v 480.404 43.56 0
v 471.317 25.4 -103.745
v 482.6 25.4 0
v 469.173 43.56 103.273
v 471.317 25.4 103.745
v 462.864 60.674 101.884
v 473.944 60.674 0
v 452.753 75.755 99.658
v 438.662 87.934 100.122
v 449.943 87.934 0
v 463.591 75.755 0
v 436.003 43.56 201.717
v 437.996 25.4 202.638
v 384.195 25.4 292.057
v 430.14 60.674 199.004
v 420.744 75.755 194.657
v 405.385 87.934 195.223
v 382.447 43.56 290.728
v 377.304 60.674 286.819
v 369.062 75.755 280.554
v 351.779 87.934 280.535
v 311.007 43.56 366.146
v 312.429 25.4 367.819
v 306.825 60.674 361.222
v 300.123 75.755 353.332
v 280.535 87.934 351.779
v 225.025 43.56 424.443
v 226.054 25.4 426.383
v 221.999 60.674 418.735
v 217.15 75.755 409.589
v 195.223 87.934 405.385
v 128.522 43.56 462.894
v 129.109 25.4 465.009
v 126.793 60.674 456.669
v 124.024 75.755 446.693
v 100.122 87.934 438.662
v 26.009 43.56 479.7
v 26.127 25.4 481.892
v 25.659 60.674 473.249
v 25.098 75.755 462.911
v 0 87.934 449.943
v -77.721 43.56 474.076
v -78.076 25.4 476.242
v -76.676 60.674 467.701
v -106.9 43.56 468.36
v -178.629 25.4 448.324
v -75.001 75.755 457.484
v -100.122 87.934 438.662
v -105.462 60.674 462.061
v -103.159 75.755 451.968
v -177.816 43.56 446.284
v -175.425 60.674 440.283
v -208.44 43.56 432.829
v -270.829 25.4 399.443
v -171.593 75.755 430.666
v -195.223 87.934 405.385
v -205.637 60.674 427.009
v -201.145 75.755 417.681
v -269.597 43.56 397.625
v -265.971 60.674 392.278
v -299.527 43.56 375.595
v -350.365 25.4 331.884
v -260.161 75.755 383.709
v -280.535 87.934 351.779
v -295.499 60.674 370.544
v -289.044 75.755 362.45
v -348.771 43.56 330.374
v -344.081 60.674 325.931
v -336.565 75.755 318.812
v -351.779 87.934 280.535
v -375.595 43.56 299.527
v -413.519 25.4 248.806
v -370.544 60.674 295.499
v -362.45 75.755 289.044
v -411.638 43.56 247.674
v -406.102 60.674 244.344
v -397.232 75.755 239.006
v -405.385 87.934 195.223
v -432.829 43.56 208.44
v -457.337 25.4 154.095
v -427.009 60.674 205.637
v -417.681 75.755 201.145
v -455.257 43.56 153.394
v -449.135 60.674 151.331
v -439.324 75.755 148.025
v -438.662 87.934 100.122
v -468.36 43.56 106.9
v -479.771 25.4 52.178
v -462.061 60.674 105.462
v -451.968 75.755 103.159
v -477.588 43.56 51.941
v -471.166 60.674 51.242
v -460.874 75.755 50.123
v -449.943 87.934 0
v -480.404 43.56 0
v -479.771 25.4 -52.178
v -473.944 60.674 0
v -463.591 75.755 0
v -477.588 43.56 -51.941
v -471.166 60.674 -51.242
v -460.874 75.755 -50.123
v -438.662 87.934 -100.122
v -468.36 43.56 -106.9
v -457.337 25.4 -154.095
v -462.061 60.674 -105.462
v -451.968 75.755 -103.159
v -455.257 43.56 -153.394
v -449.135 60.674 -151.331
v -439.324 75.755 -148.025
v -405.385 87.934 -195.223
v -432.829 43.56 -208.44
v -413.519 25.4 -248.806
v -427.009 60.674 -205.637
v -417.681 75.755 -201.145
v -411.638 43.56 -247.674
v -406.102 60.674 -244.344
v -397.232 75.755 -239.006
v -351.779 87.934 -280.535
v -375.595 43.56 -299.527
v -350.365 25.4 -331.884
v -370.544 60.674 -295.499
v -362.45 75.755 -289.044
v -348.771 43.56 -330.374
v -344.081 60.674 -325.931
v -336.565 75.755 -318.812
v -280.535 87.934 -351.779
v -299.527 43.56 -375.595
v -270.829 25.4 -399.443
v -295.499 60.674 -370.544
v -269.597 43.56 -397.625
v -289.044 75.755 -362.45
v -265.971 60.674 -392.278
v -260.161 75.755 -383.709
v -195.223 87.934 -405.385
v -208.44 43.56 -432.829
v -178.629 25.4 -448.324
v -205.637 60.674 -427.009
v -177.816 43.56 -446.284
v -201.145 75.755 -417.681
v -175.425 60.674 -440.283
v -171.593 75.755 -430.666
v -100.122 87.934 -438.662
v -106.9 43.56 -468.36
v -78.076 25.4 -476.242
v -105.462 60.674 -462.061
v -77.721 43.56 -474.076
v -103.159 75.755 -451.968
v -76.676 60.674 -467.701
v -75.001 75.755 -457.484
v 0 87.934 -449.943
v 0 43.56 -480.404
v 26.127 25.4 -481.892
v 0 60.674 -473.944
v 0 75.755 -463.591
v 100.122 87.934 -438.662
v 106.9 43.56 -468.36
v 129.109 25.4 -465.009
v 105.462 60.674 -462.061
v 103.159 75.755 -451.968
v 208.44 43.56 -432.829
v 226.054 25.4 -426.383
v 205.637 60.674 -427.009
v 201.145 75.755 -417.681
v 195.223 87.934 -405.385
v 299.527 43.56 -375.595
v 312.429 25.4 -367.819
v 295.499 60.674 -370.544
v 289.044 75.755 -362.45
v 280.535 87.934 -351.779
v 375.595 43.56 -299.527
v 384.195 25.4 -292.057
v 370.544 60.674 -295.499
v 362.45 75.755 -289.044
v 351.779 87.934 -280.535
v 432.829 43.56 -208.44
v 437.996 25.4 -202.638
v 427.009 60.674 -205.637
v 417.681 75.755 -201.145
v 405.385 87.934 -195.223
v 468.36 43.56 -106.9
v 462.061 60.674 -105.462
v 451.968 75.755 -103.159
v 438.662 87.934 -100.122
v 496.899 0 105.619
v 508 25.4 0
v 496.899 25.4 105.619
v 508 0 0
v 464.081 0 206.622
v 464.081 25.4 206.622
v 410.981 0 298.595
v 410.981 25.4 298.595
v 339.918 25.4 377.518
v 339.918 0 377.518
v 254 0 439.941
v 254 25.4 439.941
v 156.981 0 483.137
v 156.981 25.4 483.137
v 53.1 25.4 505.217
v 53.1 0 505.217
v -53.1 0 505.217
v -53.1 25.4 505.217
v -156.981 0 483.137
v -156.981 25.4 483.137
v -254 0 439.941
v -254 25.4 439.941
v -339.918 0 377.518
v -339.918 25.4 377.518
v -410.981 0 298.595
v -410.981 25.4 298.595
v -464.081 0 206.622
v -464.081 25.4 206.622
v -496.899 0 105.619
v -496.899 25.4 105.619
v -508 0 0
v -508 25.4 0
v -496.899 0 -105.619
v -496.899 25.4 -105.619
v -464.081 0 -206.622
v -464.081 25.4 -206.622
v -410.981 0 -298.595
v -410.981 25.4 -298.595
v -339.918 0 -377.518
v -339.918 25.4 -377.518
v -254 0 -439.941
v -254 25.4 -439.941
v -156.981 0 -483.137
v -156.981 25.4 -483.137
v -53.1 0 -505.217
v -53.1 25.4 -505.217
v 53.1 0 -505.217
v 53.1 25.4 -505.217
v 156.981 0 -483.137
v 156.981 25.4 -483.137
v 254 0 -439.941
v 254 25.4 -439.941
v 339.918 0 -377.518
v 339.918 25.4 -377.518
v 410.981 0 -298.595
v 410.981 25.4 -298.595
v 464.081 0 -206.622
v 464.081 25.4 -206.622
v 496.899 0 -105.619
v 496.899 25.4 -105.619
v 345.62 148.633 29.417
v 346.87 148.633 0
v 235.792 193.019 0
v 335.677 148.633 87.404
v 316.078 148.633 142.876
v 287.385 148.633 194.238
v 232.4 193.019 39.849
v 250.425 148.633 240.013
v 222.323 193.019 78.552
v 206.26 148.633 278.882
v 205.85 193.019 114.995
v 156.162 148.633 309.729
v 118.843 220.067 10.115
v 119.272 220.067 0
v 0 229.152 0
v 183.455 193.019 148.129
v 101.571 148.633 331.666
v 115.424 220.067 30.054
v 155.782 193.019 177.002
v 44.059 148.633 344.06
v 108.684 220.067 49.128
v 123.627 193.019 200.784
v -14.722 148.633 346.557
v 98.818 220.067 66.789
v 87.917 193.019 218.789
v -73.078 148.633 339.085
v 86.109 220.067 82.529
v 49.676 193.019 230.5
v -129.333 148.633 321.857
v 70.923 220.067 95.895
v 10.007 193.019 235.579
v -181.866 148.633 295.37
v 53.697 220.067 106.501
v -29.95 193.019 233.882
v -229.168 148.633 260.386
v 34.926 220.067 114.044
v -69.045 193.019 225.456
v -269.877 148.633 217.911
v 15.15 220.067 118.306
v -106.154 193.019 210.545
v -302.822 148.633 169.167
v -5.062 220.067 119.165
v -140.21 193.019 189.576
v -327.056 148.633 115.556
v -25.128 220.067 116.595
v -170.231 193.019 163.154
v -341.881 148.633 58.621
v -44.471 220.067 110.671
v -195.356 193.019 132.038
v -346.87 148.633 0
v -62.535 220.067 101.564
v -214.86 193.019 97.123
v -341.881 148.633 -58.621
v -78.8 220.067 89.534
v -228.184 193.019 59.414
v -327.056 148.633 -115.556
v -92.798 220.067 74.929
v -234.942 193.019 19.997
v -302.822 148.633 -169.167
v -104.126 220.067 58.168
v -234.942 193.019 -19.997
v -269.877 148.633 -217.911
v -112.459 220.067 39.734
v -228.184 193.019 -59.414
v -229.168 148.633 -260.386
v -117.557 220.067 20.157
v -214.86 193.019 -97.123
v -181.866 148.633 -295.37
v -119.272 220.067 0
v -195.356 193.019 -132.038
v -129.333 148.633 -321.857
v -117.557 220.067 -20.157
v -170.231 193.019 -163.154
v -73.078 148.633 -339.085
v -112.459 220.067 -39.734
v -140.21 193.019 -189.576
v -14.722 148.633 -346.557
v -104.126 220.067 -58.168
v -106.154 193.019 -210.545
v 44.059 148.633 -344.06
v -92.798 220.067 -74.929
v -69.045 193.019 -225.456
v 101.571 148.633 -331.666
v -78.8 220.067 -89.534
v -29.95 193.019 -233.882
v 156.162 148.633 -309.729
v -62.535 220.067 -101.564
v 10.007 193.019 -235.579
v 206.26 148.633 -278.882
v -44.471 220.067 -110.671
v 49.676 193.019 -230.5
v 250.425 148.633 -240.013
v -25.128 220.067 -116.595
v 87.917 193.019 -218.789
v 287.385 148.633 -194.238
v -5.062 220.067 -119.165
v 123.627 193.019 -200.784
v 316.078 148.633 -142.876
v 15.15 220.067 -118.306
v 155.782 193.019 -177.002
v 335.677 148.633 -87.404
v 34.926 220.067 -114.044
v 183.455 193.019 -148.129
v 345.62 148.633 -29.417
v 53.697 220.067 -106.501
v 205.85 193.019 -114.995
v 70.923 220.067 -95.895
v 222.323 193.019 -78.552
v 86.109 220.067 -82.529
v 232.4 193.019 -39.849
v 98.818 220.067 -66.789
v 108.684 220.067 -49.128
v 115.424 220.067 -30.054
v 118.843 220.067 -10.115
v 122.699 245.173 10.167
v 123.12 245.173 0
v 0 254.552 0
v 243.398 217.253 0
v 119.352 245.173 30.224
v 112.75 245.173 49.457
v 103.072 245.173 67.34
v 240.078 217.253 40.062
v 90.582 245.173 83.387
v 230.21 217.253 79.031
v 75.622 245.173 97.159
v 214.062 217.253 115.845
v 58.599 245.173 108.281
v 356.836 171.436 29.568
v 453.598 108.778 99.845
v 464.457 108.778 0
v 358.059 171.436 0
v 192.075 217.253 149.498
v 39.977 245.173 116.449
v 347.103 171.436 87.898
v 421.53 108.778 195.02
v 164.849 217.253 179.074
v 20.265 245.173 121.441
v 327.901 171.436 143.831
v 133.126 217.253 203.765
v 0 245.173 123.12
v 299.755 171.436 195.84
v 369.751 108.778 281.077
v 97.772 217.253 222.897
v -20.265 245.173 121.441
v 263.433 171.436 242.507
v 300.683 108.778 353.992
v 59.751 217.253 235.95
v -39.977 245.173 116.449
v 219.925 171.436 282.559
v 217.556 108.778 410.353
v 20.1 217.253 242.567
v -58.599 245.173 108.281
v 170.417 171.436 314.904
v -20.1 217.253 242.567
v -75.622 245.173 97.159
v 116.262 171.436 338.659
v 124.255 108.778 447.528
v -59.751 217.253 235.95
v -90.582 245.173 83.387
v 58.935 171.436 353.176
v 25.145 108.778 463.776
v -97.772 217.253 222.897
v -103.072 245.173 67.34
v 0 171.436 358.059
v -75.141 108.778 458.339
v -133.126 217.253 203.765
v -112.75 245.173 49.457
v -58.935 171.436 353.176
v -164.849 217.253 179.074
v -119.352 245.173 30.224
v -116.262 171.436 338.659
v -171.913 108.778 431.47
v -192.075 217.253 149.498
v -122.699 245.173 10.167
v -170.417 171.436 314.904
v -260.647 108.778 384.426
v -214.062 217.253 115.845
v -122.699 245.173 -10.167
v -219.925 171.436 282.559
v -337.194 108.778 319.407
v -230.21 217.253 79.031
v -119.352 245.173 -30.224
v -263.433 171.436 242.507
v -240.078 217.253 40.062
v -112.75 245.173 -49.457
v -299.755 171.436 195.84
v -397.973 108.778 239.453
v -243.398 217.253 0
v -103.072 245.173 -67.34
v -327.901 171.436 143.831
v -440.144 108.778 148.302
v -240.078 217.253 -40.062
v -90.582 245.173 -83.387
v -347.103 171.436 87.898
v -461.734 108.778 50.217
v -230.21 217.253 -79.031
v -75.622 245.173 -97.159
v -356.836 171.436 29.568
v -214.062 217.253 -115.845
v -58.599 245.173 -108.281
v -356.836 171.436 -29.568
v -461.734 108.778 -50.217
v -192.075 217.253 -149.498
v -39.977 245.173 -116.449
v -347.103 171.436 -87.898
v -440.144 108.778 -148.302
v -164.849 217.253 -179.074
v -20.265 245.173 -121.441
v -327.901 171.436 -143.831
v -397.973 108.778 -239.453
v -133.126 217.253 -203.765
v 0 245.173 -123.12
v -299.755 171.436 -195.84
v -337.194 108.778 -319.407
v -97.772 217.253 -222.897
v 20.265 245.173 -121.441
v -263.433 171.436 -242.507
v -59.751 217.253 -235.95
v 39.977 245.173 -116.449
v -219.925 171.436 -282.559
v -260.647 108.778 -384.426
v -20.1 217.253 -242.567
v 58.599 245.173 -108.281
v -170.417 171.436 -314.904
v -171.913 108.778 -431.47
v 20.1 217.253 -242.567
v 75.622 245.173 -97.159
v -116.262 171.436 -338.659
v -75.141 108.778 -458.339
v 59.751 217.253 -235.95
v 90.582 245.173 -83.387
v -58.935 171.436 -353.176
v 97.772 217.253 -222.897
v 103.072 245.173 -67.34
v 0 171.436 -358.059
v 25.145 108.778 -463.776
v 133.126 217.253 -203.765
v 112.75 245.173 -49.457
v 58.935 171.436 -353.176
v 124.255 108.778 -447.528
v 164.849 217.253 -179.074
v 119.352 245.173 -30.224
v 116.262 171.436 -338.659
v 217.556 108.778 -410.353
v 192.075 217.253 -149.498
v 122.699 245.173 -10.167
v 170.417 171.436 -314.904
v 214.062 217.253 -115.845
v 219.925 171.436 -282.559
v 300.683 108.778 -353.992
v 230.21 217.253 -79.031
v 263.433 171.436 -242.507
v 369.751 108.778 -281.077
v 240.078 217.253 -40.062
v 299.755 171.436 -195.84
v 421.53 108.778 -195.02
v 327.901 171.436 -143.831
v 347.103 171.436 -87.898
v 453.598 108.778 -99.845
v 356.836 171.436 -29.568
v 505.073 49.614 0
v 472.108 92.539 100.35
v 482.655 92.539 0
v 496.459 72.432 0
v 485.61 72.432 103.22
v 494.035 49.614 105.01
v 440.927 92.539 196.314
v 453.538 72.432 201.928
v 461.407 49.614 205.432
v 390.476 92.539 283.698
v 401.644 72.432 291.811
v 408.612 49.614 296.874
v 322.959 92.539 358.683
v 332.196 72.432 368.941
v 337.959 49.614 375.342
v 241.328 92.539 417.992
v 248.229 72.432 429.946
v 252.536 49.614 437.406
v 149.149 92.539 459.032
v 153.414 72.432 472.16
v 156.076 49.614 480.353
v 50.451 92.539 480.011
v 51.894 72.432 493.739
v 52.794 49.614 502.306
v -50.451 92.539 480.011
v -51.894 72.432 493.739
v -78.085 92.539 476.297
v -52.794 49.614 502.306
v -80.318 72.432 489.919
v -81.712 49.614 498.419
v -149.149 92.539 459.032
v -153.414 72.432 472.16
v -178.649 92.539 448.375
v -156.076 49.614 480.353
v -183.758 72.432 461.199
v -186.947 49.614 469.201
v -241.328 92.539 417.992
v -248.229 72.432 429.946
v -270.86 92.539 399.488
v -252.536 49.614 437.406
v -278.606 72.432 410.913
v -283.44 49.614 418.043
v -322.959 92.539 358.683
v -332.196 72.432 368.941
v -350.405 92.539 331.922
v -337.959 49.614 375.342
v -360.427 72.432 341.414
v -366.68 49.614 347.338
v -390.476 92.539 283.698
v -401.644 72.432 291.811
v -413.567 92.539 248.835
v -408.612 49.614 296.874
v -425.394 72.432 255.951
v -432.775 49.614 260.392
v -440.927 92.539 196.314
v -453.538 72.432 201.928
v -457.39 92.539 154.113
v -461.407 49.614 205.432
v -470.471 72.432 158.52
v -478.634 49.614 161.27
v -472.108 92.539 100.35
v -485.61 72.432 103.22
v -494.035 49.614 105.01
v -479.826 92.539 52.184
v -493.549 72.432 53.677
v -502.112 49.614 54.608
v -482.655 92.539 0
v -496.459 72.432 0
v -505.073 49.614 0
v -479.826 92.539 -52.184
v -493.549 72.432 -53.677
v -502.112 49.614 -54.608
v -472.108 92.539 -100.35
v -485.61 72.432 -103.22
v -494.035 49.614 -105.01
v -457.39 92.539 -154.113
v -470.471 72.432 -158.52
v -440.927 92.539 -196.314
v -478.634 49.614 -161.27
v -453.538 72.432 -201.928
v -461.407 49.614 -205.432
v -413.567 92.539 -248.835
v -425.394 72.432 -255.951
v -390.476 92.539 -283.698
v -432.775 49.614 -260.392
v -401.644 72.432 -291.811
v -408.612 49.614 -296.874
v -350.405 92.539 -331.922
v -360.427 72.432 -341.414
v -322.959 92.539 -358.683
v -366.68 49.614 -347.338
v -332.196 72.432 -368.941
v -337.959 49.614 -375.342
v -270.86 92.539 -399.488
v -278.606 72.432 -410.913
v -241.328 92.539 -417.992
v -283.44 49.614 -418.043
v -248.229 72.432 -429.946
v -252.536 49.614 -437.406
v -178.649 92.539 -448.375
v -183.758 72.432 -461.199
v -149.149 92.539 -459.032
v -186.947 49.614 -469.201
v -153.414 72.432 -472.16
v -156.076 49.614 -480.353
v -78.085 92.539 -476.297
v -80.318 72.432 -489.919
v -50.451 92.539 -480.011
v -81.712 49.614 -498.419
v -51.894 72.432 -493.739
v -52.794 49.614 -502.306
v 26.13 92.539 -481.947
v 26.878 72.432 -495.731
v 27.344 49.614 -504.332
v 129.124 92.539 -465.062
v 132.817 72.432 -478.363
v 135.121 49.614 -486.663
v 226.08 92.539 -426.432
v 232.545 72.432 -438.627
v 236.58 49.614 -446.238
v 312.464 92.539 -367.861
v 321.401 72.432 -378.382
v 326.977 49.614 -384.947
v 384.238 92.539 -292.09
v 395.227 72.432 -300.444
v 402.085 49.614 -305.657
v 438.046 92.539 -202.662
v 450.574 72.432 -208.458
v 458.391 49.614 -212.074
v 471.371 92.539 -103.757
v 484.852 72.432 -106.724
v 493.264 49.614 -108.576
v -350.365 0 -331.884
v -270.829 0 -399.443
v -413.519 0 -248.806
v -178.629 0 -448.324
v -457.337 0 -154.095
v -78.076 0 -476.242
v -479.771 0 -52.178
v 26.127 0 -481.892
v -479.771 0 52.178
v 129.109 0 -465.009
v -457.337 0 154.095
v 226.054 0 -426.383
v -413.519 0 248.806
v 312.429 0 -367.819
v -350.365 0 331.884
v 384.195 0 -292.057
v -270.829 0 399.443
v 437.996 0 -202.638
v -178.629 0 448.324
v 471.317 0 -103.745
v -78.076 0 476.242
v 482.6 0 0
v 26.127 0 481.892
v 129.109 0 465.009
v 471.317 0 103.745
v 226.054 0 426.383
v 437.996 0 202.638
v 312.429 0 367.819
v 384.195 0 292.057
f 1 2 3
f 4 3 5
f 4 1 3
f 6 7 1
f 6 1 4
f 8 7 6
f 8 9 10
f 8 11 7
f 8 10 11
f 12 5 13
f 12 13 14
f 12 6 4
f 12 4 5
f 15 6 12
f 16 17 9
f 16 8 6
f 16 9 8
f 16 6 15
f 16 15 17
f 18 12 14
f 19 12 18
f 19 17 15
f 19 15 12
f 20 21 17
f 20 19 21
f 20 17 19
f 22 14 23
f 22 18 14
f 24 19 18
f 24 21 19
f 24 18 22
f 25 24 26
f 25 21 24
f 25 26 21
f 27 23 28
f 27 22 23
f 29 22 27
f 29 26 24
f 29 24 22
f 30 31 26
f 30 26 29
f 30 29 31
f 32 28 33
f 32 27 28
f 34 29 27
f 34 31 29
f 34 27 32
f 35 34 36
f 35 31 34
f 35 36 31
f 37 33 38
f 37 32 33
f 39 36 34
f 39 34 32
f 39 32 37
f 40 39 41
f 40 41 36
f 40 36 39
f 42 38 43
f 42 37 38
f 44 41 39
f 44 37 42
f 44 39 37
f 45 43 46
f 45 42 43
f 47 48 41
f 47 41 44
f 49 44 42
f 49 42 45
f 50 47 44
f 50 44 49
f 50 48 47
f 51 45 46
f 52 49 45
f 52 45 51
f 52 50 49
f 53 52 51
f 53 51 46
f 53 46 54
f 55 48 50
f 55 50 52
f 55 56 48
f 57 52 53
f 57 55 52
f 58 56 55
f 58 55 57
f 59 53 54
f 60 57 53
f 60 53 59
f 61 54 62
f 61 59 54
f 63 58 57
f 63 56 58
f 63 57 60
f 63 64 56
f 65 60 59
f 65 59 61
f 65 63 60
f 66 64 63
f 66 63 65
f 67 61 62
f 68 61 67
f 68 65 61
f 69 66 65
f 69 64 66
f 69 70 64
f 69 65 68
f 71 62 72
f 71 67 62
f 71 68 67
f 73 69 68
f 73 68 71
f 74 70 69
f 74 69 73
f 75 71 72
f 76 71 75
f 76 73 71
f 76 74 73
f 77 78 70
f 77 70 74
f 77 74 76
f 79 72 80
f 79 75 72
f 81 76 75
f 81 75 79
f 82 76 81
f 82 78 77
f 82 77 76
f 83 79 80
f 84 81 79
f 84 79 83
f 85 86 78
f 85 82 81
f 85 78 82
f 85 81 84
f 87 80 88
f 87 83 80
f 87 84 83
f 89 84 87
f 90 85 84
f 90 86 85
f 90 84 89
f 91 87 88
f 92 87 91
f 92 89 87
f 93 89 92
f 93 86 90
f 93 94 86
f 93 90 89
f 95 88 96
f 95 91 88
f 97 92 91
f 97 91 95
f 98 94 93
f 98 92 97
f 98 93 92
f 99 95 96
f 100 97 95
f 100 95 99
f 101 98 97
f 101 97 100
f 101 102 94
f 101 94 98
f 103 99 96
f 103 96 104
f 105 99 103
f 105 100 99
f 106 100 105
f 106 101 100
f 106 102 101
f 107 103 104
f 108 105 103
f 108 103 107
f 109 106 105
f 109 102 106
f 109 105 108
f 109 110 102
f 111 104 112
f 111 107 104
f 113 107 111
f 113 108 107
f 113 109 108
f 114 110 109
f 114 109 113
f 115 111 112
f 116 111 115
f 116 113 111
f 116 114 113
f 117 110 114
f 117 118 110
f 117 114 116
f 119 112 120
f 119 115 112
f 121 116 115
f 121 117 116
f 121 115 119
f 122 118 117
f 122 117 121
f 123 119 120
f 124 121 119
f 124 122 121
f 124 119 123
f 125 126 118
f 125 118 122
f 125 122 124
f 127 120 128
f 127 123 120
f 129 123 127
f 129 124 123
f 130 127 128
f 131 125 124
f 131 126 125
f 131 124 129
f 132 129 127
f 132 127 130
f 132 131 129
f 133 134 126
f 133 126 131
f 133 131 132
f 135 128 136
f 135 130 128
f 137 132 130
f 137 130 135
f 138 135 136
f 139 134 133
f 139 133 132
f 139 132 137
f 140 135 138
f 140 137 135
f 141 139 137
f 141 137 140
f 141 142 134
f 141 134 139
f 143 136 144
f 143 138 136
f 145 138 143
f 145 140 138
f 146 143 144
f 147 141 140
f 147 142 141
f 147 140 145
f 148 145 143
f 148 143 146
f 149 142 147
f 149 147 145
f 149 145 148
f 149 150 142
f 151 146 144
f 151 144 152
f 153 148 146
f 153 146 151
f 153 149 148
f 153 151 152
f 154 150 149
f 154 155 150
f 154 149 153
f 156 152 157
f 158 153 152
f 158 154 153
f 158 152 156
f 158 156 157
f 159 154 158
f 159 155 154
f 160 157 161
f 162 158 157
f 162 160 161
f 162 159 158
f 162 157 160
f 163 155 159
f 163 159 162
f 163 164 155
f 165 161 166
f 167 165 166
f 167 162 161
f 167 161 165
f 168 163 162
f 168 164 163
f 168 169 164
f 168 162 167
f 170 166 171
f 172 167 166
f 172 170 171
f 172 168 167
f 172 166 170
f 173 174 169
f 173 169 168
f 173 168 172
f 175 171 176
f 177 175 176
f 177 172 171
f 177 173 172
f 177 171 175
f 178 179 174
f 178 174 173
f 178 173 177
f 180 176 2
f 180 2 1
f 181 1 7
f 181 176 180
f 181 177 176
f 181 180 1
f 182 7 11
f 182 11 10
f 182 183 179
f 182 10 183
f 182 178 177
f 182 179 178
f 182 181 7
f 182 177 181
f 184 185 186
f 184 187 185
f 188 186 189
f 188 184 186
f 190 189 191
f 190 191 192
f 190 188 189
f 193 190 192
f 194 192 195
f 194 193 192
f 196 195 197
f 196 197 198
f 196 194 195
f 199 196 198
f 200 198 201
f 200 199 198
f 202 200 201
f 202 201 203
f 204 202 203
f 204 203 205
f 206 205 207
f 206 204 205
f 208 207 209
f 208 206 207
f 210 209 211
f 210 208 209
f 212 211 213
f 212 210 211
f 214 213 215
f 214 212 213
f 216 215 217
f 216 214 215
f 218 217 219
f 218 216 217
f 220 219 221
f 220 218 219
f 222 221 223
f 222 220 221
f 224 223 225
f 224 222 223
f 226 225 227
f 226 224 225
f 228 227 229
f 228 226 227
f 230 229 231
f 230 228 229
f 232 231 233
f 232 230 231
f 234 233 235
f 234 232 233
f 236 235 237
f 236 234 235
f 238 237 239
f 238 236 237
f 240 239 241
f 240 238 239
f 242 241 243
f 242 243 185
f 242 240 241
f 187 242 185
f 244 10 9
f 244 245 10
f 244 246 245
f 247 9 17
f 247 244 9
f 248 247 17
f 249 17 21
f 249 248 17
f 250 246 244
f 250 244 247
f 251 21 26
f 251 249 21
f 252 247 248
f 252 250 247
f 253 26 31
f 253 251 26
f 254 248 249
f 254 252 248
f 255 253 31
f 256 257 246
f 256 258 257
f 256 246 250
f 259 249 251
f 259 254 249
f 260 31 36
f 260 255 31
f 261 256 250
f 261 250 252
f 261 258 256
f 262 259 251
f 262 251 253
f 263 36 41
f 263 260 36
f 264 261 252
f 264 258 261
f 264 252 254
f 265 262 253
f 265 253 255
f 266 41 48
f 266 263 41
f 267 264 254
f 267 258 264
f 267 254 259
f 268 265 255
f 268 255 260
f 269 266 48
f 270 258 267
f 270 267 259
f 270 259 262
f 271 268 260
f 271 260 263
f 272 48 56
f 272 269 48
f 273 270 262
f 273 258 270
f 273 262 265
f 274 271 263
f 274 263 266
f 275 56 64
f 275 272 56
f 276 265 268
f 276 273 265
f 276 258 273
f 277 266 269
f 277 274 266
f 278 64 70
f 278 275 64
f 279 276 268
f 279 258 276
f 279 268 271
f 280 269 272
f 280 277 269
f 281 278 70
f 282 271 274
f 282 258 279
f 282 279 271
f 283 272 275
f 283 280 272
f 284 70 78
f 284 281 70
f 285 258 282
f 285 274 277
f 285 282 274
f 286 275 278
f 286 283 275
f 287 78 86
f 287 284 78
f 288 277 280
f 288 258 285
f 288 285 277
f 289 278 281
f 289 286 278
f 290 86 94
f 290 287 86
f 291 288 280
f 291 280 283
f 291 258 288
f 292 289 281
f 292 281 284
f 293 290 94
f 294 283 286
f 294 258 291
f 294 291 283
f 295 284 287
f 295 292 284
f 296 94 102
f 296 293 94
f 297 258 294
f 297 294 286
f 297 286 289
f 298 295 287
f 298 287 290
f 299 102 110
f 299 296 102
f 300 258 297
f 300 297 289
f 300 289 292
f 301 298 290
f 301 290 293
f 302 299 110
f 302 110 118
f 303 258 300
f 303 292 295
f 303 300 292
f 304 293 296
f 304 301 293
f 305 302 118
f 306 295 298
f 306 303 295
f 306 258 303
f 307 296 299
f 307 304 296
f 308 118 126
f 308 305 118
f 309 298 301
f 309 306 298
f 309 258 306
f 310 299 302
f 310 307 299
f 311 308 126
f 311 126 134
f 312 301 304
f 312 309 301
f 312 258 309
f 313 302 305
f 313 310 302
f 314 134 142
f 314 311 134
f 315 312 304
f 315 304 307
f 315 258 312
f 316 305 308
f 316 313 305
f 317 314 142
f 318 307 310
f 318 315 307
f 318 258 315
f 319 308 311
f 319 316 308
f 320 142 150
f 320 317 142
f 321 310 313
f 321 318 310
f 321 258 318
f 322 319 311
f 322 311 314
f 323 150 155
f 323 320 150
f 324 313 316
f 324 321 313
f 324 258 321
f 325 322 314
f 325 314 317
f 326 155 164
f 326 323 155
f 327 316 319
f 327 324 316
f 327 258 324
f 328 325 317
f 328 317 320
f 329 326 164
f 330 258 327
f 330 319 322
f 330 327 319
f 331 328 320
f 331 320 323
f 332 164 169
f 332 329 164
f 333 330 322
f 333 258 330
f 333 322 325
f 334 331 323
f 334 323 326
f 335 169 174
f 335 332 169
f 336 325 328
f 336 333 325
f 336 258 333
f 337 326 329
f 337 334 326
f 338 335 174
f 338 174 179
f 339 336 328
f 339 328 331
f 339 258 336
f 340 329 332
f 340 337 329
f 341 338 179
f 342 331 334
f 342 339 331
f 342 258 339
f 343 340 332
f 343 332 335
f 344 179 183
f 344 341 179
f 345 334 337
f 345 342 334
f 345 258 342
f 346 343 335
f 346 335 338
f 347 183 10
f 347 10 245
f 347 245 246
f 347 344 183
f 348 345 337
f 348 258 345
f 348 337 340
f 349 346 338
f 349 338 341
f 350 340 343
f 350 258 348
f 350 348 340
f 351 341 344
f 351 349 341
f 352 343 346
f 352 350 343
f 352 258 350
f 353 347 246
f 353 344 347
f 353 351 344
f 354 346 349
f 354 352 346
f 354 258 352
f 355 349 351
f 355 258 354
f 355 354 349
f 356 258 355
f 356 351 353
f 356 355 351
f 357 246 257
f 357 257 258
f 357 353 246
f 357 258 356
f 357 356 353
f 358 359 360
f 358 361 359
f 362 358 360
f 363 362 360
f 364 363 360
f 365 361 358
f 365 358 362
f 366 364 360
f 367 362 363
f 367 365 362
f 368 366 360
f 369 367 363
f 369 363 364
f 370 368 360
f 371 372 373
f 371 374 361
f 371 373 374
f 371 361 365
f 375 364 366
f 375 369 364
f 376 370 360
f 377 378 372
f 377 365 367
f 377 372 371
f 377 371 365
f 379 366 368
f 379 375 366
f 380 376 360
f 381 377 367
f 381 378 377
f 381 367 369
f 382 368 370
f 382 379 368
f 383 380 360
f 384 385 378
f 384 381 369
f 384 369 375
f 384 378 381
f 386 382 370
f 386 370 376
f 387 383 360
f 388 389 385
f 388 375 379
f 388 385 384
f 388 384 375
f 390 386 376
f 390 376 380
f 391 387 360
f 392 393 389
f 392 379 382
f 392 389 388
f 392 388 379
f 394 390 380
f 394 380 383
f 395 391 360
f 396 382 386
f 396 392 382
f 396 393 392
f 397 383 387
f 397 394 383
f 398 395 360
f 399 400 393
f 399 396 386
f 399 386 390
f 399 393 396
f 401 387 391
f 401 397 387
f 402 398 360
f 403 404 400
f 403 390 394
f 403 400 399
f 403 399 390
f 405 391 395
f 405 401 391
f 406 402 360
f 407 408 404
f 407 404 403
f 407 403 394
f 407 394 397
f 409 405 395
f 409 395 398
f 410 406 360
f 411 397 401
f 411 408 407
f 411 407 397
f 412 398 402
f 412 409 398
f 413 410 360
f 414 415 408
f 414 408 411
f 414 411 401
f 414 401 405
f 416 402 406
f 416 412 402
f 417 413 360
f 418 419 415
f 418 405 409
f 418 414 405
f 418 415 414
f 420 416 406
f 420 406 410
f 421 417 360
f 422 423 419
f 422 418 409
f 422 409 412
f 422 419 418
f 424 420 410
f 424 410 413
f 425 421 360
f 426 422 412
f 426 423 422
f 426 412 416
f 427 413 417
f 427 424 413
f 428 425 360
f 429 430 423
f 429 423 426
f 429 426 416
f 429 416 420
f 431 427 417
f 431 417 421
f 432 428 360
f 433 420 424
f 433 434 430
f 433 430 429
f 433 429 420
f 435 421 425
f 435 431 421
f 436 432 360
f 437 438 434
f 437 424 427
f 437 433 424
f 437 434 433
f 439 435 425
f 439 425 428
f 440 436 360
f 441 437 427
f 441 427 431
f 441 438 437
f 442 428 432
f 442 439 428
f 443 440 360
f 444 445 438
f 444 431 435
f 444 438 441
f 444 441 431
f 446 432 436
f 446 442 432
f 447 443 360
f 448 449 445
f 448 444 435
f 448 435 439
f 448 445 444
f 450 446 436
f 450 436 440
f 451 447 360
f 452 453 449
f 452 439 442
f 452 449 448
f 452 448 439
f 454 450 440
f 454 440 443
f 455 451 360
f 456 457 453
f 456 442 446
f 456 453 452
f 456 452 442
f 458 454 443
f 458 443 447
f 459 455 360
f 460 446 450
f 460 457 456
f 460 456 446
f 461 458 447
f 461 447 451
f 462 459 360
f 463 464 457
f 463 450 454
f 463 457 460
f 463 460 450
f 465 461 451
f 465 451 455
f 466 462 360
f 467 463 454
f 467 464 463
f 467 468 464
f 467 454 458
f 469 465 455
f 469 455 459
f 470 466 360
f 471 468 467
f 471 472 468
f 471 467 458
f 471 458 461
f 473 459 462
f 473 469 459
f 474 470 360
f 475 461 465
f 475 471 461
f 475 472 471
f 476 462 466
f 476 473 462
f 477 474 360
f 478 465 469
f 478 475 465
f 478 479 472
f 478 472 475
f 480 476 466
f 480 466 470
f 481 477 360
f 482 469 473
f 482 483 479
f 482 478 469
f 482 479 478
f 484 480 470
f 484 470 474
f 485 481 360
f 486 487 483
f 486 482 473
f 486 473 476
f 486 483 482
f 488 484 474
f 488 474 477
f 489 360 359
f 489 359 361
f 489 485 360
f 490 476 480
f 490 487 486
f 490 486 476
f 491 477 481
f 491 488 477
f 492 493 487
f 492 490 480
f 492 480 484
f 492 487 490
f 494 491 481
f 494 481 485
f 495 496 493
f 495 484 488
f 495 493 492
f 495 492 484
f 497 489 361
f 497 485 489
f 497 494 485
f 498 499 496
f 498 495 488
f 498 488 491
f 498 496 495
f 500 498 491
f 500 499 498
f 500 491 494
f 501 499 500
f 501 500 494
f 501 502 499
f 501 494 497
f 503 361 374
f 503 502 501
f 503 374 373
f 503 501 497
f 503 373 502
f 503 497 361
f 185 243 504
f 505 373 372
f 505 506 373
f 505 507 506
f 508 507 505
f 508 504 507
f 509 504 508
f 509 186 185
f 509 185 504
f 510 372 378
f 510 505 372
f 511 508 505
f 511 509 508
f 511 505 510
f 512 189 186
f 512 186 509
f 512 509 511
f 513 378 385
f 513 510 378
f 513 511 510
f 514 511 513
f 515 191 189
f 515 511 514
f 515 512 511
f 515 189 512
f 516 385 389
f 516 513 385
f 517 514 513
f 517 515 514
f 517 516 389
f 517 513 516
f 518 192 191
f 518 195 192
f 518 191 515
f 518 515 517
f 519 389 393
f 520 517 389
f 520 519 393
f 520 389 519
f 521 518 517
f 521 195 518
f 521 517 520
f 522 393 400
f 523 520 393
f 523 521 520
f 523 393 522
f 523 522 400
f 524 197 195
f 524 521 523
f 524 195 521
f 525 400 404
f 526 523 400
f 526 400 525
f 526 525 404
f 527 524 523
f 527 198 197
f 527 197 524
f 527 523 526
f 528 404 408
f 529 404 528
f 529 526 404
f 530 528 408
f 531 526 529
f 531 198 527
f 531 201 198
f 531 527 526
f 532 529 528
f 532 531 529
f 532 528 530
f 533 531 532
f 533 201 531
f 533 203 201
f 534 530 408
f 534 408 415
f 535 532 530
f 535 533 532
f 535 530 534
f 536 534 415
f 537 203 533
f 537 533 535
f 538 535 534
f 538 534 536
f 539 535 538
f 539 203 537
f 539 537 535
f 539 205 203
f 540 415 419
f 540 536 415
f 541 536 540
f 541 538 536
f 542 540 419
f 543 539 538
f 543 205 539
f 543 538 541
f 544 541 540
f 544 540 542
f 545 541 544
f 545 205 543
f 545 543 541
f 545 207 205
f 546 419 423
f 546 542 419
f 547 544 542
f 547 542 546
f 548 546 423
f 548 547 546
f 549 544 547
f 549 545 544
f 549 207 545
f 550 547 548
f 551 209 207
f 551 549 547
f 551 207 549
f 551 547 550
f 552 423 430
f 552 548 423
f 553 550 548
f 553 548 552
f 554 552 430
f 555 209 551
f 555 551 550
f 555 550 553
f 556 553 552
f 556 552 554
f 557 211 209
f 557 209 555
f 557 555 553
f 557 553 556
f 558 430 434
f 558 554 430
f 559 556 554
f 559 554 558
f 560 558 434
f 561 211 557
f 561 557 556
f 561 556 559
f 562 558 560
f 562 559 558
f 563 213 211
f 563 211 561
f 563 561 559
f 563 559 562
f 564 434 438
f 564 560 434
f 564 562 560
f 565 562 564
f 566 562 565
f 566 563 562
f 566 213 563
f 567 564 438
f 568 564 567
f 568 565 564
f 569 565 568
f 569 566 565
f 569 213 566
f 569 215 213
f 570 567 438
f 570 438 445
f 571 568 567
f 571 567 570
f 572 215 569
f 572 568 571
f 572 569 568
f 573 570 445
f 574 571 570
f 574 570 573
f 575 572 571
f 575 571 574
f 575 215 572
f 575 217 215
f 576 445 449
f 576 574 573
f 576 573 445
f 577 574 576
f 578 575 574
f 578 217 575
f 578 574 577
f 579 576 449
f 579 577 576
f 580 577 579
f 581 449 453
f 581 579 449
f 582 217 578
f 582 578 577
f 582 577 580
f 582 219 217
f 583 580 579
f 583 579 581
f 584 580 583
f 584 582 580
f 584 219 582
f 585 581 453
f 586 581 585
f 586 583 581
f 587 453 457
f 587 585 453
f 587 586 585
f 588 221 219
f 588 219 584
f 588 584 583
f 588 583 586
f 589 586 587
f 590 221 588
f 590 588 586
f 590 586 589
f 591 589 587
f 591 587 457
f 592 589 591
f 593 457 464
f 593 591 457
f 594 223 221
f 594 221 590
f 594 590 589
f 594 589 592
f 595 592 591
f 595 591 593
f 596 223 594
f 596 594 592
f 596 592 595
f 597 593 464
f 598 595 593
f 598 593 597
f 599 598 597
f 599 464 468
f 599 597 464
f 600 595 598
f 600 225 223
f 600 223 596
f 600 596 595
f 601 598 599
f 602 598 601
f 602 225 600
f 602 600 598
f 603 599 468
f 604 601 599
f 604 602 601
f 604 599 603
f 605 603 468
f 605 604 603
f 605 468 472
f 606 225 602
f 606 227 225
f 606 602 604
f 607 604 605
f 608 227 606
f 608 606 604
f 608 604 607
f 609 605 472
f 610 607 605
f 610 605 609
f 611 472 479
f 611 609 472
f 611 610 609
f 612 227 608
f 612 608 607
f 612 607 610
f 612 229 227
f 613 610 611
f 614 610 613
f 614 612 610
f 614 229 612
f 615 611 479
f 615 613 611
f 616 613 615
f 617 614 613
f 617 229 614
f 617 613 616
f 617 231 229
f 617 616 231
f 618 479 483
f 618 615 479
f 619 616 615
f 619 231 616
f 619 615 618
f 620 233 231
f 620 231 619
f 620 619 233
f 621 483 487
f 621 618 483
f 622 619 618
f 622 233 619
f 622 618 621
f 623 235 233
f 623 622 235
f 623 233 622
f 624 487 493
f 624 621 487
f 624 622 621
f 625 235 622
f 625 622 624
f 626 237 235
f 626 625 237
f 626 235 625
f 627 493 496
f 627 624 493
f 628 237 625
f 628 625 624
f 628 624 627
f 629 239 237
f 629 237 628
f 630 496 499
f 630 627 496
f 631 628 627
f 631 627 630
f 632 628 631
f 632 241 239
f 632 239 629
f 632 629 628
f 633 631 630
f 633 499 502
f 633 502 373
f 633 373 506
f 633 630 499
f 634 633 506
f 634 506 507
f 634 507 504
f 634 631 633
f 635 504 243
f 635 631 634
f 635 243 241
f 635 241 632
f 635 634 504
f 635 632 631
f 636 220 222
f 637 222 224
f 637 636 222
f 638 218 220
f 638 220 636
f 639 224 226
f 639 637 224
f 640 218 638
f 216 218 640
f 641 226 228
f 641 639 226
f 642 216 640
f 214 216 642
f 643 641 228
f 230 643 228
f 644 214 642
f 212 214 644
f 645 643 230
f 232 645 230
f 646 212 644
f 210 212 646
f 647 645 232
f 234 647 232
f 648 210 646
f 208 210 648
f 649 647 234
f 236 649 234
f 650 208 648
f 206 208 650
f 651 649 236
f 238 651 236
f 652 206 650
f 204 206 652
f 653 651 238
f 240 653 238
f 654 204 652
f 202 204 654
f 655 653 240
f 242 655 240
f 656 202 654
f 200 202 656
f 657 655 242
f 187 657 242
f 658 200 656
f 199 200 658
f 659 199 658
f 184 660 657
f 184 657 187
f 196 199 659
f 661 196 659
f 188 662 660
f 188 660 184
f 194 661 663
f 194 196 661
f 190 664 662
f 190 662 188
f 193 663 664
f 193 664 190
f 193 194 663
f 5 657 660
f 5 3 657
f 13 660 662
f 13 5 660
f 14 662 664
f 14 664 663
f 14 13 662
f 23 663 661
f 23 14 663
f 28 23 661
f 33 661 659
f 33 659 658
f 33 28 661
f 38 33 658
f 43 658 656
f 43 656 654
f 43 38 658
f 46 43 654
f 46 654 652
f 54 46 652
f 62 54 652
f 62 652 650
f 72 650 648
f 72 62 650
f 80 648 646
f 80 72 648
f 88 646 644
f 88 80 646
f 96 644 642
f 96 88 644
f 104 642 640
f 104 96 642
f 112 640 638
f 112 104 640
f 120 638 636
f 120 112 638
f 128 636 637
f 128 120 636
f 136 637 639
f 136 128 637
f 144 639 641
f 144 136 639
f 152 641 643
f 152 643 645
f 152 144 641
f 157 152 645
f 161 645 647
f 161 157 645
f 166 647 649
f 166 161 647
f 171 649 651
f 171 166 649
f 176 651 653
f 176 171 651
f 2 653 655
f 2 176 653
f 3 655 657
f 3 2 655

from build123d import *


with BuildPart() as part:
    # Sketch1 → Revolve1 (revolve)
    with BuildSketch(Plane.XY):
        with BuildLine():
            Line((508, 25.4), (508, 0))
            Line((508, 0), (482.6, 0))
            Line((482.6, 0), (482.6, 25.4))
            ThreePointArc((482.6, 25.4), (473.944080845, 60.673745801), (449.942857143, 87.933667667))
            ThreePointArc((449.942857143, 87.933667667), (235.791918316, 193.018653743), (0, 229.152435112))
            Line((0, 229.152435112), (0, 254.552435112))
            ThreePointArc((0, 254.552435112), (243.398109229, 217.253047893), (464.457142857, 108.778223555))
            ThreePointArc((464.457142857, 108.778223555), (496.458774459, 72.431661068), (508, 25.4))
        make_face()
    revolve(axis=Axis((0, 254.552435112, 0), (0, -1, 0)))


solid = part.part
